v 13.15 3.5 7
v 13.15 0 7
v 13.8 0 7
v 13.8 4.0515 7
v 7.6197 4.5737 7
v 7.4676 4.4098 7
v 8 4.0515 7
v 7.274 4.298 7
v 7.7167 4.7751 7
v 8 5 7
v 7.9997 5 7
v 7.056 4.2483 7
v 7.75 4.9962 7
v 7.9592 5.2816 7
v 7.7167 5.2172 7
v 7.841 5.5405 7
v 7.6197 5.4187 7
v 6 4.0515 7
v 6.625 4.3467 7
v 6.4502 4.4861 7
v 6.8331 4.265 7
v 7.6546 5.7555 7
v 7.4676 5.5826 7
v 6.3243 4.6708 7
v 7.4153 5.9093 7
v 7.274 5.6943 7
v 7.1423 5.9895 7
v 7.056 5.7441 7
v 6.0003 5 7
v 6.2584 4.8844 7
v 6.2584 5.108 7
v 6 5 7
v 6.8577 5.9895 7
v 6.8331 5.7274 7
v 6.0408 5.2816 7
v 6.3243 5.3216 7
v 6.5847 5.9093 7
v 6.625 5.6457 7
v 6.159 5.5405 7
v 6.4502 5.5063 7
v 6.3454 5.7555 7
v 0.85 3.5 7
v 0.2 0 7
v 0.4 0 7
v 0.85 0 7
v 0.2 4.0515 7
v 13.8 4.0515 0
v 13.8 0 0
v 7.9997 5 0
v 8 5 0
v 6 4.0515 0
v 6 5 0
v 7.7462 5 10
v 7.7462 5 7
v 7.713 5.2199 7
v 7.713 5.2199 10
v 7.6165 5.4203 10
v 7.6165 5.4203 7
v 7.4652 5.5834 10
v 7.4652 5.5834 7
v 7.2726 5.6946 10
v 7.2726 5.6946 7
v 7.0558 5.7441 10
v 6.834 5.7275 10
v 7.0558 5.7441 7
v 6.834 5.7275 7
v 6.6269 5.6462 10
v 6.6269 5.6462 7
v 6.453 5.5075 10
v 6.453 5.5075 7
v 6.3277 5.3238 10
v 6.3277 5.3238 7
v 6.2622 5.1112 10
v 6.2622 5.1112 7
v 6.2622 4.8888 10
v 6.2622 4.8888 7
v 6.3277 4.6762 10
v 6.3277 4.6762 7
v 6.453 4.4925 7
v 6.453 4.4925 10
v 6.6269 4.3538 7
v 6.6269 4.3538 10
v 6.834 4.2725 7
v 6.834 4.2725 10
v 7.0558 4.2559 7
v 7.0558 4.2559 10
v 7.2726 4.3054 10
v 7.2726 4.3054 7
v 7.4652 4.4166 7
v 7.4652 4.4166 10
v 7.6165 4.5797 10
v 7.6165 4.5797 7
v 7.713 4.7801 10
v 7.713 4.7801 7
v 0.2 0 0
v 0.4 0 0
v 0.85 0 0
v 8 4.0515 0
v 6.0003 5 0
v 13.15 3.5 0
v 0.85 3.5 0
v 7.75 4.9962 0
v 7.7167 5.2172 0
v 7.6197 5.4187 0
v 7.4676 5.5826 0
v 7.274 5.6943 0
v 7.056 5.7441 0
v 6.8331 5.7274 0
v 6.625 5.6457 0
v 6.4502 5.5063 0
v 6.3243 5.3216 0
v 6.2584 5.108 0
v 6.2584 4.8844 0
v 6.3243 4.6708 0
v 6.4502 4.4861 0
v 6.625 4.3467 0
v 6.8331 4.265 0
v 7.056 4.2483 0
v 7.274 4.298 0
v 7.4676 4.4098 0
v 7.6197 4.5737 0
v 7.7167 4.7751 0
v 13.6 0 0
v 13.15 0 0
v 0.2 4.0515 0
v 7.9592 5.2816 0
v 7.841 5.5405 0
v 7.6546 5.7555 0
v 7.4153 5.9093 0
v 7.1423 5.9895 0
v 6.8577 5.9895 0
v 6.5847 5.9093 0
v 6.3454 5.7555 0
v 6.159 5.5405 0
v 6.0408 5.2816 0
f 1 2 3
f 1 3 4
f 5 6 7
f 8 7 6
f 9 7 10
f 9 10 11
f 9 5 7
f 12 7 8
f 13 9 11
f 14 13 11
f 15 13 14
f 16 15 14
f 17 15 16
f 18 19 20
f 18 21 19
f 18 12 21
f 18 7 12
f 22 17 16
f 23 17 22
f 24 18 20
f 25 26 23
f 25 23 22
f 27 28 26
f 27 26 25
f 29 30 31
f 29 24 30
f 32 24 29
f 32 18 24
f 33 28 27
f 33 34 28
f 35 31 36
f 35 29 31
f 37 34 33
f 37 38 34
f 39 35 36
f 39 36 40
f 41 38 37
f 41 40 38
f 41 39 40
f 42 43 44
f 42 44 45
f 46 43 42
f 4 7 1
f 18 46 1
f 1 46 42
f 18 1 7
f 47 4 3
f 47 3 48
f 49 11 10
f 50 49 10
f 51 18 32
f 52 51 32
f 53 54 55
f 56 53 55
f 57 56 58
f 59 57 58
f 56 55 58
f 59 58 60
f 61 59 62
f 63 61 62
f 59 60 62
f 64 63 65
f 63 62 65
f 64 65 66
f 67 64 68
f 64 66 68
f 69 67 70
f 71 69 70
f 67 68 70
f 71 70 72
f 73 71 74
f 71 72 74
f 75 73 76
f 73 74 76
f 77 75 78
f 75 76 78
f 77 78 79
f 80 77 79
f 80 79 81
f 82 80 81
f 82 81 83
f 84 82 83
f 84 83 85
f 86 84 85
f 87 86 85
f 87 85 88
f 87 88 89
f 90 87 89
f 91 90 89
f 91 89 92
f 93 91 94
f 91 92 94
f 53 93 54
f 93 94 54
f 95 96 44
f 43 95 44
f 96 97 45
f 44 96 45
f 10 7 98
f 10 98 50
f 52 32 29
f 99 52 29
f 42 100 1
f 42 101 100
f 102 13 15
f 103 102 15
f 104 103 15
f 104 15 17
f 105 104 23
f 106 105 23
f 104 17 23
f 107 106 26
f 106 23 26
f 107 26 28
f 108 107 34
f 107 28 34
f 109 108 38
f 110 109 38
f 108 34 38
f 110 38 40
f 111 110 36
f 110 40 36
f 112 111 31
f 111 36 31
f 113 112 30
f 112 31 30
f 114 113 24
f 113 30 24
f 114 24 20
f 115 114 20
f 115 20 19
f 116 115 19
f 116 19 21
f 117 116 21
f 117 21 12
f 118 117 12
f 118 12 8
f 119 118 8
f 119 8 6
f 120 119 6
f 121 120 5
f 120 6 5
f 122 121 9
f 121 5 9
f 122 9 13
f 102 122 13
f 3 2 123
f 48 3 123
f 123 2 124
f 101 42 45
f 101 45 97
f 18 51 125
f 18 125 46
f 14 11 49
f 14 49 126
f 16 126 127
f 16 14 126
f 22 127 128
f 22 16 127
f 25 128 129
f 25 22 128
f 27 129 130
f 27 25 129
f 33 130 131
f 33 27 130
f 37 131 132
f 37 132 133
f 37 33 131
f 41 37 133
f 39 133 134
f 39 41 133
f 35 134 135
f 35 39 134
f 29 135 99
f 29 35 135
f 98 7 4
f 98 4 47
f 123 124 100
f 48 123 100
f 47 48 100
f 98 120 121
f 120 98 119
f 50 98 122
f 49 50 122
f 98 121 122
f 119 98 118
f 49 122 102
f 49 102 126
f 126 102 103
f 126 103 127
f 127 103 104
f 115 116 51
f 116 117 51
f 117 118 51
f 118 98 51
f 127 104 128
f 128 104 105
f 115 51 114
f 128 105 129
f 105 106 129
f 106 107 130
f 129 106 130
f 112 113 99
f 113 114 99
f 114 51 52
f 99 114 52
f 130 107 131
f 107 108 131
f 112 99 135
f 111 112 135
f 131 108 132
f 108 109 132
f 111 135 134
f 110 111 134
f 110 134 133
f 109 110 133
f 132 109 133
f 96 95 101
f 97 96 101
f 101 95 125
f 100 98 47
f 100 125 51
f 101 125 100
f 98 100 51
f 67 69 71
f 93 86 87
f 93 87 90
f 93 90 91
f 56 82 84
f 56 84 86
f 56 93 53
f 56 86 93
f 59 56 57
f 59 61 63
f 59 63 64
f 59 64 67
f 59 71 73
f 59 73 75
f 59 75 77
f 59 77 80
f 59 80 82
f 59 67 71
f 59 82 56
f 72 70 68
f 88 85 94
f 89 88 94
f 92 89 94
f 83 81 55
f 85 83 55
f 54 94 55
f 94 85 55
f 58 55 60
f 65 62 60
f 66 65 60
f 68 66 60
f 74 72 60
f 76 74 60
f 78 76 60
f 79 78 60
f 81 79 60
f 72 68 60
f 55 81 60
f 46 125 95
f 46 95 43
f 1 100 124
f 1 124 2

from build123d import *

# Parameters (mm, degrees)
SKETCH1_W            = 14
SKETCH1_H            = 5
BOSS_EXTRUDE1_DEPTH  = 7
SKETCH7_W            = 12
SKETCH7_H            = 3.5
CUT_EXTRUDE1_DEPTH   = 17.431676725
SKETCH8_W            = 14
SKETCH8_H            = 0.948534091
CUT_EXTRUDE2_DEPTH   = 7
SKETCH20_W           = 2
SKETCH20_H           = 0.948534091
BOSS_EXTRUDE9_DEPTH  = 7
SKETCH21_R           = 0.999676317
BOSS_EXTRUDE10_DEPTH = 7
SKETCH22_R           = 0.75
CUT_EXTRUDE3_DEPTH   = 7
SKETCH23_W           = 7
SKETCH23_H           = 4.051465909
CUT_EXTRUDE4_DEPTH   = 0.4
SKETCH24_W           = 7
SKETCH24_H           = 4.051465909
CUT_EXTRUDE5_DEPTH   = 0.4
SKETCH25_W           = 7
SKETCH25_H           = 4.051465909
BOSS_EXTRUDE13_DEPTH = 0.2
SKETCH26_W           = 7
SKETCH26_H           = 4.051465909
BOSS_EXTRUDE14_DEPTH = 0.2
SKETCH29_W           = 7
SKETCH29_H           = 3.5
CUT_EXTRUDE8_DEPTH   = 0.15
SKETCH30_W           = 7
SKETCH30_H           = 3.5
CUT_EXTRUDE9_DEPTH   = 0.15
SKETCH31_R           = 0.746179914
BOSS_EXTRUDE15_DEPTH = 3


with BuildPart() as part:
    # Sketch1 → Boss-Extrude1 (new body)
    with BuildSketch(Plane.XY):
        with Locations((7, 2.5)):
            Rectangle(SKETCH1_W, SKETCH1_H)
    extrude(amount=BOSS_EXTRUDE1_DEPTH)

    # Sketch7 → Cut-Extrude1 (cut, through all)
    with BuildSketch(Plane.XY.offset(7)):
        with Locations((7, 1.75)):
            Rectangle(SKETCH7_W, SKETCH7_H)
    extrude(amount=-CUT_EXTRUDE1_DEPTH, mode=Mode.SUBTRACT)

    # Sketch8 → Cut-Extrude2 (cut)
    with BuildSketch(Plane.XY.offset(7)):
        with Locations((7, 4.525732955)):
            Rectangle(SKETCH8_W, SKETCH8_H)
    extrude(amount=-CUT_EXTRUDE2_DEPTH, mode=Mode.SUBTRACT)

    # Sketch20 → Boss-Extrude9 (add)
    with BuildSketch(Plane.XY.offset(7)):
        with Locations((7, 4.525732955)):
            Rectangle(SKETCH20_W, SKETCH20_H)
    extrude(amount=-BOSS_EXTRUDE9_DEPTH)

    # Sketch21 → Boss-Extrude10 (add)
    with BuildSketch(Plane.XY.offset(7)):
        with Locations((7, 5)):
            Circle(SKETCH21_R)
    extrude(amount=-BOSS_EXTRUDE10_DEPTH)

    # Sketch22 → Cut-Extrude3 (cut)
    with BuildSketch(Plane.XY.offset(7)):
        with Locations((7, 4.996179914)):
            Circle(SKETCH22_R)
    extrude(amount=-CUT_EXTRUDE3_DEPTH, mode=Mode.SUBTRACT)

    # Sketch23 → Cut-Extrude4 (cut)
    with BuildSketch(Plane.ZY):
        with Locations((3.5, 2.025732955)):
            Rectangle(SKETCH23_W, SKETCH23_H)
    extrude(amount=-CUT_EXTRUDE4_DEPTH, mode=Mode.SUBTRACT)

    # Sketch24 → Cut-Extrude5 (cut)
    with BuildSketch(Plane(origin=(14, 0, 0), x_dir=(0, 0, -1), z_dir=(1, 0, 0))):
        with Locations((-3.5, 2.025732955)):
            Rectangle(SKETCH24_W, SKETCH24_H)
    extrude(amount=-CUT_EXTRUDE5_DEPTH, mode=Mode.SUBTRACT)

    # Sketch25 → Boss-Extrude13 (add)
    with BuildSketch(Plane.ZY.offset(-0.4)):
        with Locations((3.5, 2.025732955)):
            Rectangle(SKETCH25_W, SKETCH25_H)
    extrude(amount=BOSS_EXTRUDE13_DEPTH)

    # Sketch26 → Boss-Extrude14 (add)
    with BuildSketch(Plane(origin=(13.6, 0, 0), x_dir=(0, 0, -1), z_dir=(1, 0, 0))):
        with Locations((-3.5, 2.025732955)):
            Rectangle(SKETCH26_W, SKETCH26_H)
    extrude(amount=BOSS_EXTRUDE14_DEPTH)

    # Sketch29 → Cut-Extrude8 (cut)
    with BuildSketch(Plane(origin=(1, 0, 0), x_dir=(0, 0, -1), z_dir=(1, 0, 0))):
        with Locations((-3.5, 1.75)):
            Rectangle(SKETCH29_W, SKETCH29_H)
    extrude(amount=-CUT_EXTRUDE8_DEPTH, mode=Mode.SUBTRACT)

    # Sketch30 → Cut-Extrude9 (cut)
    with BuildSketch(Plane.ZY.offset(-13)):
        with Locations((3.5, 1.75)):
            Rectangle(SKETCH30_W, SKETCH30_H)
    extrude(amount=-CUT_EXTRUDE9_DEPTH, mode=Mode.SUBTRACT)


with BuildPart() as body_2:
    # Sketch31 → Boss-Extrude15 (new body)
    with BuildSketch(Plane.XY.offset(7)):
        with Locations((7, 5)):
            Circle(SKETCH31_R)
    extrude(amount=BOSS_EXTRUDE15_DEPTH)


solid = Compound([part.part, body_2.part])
